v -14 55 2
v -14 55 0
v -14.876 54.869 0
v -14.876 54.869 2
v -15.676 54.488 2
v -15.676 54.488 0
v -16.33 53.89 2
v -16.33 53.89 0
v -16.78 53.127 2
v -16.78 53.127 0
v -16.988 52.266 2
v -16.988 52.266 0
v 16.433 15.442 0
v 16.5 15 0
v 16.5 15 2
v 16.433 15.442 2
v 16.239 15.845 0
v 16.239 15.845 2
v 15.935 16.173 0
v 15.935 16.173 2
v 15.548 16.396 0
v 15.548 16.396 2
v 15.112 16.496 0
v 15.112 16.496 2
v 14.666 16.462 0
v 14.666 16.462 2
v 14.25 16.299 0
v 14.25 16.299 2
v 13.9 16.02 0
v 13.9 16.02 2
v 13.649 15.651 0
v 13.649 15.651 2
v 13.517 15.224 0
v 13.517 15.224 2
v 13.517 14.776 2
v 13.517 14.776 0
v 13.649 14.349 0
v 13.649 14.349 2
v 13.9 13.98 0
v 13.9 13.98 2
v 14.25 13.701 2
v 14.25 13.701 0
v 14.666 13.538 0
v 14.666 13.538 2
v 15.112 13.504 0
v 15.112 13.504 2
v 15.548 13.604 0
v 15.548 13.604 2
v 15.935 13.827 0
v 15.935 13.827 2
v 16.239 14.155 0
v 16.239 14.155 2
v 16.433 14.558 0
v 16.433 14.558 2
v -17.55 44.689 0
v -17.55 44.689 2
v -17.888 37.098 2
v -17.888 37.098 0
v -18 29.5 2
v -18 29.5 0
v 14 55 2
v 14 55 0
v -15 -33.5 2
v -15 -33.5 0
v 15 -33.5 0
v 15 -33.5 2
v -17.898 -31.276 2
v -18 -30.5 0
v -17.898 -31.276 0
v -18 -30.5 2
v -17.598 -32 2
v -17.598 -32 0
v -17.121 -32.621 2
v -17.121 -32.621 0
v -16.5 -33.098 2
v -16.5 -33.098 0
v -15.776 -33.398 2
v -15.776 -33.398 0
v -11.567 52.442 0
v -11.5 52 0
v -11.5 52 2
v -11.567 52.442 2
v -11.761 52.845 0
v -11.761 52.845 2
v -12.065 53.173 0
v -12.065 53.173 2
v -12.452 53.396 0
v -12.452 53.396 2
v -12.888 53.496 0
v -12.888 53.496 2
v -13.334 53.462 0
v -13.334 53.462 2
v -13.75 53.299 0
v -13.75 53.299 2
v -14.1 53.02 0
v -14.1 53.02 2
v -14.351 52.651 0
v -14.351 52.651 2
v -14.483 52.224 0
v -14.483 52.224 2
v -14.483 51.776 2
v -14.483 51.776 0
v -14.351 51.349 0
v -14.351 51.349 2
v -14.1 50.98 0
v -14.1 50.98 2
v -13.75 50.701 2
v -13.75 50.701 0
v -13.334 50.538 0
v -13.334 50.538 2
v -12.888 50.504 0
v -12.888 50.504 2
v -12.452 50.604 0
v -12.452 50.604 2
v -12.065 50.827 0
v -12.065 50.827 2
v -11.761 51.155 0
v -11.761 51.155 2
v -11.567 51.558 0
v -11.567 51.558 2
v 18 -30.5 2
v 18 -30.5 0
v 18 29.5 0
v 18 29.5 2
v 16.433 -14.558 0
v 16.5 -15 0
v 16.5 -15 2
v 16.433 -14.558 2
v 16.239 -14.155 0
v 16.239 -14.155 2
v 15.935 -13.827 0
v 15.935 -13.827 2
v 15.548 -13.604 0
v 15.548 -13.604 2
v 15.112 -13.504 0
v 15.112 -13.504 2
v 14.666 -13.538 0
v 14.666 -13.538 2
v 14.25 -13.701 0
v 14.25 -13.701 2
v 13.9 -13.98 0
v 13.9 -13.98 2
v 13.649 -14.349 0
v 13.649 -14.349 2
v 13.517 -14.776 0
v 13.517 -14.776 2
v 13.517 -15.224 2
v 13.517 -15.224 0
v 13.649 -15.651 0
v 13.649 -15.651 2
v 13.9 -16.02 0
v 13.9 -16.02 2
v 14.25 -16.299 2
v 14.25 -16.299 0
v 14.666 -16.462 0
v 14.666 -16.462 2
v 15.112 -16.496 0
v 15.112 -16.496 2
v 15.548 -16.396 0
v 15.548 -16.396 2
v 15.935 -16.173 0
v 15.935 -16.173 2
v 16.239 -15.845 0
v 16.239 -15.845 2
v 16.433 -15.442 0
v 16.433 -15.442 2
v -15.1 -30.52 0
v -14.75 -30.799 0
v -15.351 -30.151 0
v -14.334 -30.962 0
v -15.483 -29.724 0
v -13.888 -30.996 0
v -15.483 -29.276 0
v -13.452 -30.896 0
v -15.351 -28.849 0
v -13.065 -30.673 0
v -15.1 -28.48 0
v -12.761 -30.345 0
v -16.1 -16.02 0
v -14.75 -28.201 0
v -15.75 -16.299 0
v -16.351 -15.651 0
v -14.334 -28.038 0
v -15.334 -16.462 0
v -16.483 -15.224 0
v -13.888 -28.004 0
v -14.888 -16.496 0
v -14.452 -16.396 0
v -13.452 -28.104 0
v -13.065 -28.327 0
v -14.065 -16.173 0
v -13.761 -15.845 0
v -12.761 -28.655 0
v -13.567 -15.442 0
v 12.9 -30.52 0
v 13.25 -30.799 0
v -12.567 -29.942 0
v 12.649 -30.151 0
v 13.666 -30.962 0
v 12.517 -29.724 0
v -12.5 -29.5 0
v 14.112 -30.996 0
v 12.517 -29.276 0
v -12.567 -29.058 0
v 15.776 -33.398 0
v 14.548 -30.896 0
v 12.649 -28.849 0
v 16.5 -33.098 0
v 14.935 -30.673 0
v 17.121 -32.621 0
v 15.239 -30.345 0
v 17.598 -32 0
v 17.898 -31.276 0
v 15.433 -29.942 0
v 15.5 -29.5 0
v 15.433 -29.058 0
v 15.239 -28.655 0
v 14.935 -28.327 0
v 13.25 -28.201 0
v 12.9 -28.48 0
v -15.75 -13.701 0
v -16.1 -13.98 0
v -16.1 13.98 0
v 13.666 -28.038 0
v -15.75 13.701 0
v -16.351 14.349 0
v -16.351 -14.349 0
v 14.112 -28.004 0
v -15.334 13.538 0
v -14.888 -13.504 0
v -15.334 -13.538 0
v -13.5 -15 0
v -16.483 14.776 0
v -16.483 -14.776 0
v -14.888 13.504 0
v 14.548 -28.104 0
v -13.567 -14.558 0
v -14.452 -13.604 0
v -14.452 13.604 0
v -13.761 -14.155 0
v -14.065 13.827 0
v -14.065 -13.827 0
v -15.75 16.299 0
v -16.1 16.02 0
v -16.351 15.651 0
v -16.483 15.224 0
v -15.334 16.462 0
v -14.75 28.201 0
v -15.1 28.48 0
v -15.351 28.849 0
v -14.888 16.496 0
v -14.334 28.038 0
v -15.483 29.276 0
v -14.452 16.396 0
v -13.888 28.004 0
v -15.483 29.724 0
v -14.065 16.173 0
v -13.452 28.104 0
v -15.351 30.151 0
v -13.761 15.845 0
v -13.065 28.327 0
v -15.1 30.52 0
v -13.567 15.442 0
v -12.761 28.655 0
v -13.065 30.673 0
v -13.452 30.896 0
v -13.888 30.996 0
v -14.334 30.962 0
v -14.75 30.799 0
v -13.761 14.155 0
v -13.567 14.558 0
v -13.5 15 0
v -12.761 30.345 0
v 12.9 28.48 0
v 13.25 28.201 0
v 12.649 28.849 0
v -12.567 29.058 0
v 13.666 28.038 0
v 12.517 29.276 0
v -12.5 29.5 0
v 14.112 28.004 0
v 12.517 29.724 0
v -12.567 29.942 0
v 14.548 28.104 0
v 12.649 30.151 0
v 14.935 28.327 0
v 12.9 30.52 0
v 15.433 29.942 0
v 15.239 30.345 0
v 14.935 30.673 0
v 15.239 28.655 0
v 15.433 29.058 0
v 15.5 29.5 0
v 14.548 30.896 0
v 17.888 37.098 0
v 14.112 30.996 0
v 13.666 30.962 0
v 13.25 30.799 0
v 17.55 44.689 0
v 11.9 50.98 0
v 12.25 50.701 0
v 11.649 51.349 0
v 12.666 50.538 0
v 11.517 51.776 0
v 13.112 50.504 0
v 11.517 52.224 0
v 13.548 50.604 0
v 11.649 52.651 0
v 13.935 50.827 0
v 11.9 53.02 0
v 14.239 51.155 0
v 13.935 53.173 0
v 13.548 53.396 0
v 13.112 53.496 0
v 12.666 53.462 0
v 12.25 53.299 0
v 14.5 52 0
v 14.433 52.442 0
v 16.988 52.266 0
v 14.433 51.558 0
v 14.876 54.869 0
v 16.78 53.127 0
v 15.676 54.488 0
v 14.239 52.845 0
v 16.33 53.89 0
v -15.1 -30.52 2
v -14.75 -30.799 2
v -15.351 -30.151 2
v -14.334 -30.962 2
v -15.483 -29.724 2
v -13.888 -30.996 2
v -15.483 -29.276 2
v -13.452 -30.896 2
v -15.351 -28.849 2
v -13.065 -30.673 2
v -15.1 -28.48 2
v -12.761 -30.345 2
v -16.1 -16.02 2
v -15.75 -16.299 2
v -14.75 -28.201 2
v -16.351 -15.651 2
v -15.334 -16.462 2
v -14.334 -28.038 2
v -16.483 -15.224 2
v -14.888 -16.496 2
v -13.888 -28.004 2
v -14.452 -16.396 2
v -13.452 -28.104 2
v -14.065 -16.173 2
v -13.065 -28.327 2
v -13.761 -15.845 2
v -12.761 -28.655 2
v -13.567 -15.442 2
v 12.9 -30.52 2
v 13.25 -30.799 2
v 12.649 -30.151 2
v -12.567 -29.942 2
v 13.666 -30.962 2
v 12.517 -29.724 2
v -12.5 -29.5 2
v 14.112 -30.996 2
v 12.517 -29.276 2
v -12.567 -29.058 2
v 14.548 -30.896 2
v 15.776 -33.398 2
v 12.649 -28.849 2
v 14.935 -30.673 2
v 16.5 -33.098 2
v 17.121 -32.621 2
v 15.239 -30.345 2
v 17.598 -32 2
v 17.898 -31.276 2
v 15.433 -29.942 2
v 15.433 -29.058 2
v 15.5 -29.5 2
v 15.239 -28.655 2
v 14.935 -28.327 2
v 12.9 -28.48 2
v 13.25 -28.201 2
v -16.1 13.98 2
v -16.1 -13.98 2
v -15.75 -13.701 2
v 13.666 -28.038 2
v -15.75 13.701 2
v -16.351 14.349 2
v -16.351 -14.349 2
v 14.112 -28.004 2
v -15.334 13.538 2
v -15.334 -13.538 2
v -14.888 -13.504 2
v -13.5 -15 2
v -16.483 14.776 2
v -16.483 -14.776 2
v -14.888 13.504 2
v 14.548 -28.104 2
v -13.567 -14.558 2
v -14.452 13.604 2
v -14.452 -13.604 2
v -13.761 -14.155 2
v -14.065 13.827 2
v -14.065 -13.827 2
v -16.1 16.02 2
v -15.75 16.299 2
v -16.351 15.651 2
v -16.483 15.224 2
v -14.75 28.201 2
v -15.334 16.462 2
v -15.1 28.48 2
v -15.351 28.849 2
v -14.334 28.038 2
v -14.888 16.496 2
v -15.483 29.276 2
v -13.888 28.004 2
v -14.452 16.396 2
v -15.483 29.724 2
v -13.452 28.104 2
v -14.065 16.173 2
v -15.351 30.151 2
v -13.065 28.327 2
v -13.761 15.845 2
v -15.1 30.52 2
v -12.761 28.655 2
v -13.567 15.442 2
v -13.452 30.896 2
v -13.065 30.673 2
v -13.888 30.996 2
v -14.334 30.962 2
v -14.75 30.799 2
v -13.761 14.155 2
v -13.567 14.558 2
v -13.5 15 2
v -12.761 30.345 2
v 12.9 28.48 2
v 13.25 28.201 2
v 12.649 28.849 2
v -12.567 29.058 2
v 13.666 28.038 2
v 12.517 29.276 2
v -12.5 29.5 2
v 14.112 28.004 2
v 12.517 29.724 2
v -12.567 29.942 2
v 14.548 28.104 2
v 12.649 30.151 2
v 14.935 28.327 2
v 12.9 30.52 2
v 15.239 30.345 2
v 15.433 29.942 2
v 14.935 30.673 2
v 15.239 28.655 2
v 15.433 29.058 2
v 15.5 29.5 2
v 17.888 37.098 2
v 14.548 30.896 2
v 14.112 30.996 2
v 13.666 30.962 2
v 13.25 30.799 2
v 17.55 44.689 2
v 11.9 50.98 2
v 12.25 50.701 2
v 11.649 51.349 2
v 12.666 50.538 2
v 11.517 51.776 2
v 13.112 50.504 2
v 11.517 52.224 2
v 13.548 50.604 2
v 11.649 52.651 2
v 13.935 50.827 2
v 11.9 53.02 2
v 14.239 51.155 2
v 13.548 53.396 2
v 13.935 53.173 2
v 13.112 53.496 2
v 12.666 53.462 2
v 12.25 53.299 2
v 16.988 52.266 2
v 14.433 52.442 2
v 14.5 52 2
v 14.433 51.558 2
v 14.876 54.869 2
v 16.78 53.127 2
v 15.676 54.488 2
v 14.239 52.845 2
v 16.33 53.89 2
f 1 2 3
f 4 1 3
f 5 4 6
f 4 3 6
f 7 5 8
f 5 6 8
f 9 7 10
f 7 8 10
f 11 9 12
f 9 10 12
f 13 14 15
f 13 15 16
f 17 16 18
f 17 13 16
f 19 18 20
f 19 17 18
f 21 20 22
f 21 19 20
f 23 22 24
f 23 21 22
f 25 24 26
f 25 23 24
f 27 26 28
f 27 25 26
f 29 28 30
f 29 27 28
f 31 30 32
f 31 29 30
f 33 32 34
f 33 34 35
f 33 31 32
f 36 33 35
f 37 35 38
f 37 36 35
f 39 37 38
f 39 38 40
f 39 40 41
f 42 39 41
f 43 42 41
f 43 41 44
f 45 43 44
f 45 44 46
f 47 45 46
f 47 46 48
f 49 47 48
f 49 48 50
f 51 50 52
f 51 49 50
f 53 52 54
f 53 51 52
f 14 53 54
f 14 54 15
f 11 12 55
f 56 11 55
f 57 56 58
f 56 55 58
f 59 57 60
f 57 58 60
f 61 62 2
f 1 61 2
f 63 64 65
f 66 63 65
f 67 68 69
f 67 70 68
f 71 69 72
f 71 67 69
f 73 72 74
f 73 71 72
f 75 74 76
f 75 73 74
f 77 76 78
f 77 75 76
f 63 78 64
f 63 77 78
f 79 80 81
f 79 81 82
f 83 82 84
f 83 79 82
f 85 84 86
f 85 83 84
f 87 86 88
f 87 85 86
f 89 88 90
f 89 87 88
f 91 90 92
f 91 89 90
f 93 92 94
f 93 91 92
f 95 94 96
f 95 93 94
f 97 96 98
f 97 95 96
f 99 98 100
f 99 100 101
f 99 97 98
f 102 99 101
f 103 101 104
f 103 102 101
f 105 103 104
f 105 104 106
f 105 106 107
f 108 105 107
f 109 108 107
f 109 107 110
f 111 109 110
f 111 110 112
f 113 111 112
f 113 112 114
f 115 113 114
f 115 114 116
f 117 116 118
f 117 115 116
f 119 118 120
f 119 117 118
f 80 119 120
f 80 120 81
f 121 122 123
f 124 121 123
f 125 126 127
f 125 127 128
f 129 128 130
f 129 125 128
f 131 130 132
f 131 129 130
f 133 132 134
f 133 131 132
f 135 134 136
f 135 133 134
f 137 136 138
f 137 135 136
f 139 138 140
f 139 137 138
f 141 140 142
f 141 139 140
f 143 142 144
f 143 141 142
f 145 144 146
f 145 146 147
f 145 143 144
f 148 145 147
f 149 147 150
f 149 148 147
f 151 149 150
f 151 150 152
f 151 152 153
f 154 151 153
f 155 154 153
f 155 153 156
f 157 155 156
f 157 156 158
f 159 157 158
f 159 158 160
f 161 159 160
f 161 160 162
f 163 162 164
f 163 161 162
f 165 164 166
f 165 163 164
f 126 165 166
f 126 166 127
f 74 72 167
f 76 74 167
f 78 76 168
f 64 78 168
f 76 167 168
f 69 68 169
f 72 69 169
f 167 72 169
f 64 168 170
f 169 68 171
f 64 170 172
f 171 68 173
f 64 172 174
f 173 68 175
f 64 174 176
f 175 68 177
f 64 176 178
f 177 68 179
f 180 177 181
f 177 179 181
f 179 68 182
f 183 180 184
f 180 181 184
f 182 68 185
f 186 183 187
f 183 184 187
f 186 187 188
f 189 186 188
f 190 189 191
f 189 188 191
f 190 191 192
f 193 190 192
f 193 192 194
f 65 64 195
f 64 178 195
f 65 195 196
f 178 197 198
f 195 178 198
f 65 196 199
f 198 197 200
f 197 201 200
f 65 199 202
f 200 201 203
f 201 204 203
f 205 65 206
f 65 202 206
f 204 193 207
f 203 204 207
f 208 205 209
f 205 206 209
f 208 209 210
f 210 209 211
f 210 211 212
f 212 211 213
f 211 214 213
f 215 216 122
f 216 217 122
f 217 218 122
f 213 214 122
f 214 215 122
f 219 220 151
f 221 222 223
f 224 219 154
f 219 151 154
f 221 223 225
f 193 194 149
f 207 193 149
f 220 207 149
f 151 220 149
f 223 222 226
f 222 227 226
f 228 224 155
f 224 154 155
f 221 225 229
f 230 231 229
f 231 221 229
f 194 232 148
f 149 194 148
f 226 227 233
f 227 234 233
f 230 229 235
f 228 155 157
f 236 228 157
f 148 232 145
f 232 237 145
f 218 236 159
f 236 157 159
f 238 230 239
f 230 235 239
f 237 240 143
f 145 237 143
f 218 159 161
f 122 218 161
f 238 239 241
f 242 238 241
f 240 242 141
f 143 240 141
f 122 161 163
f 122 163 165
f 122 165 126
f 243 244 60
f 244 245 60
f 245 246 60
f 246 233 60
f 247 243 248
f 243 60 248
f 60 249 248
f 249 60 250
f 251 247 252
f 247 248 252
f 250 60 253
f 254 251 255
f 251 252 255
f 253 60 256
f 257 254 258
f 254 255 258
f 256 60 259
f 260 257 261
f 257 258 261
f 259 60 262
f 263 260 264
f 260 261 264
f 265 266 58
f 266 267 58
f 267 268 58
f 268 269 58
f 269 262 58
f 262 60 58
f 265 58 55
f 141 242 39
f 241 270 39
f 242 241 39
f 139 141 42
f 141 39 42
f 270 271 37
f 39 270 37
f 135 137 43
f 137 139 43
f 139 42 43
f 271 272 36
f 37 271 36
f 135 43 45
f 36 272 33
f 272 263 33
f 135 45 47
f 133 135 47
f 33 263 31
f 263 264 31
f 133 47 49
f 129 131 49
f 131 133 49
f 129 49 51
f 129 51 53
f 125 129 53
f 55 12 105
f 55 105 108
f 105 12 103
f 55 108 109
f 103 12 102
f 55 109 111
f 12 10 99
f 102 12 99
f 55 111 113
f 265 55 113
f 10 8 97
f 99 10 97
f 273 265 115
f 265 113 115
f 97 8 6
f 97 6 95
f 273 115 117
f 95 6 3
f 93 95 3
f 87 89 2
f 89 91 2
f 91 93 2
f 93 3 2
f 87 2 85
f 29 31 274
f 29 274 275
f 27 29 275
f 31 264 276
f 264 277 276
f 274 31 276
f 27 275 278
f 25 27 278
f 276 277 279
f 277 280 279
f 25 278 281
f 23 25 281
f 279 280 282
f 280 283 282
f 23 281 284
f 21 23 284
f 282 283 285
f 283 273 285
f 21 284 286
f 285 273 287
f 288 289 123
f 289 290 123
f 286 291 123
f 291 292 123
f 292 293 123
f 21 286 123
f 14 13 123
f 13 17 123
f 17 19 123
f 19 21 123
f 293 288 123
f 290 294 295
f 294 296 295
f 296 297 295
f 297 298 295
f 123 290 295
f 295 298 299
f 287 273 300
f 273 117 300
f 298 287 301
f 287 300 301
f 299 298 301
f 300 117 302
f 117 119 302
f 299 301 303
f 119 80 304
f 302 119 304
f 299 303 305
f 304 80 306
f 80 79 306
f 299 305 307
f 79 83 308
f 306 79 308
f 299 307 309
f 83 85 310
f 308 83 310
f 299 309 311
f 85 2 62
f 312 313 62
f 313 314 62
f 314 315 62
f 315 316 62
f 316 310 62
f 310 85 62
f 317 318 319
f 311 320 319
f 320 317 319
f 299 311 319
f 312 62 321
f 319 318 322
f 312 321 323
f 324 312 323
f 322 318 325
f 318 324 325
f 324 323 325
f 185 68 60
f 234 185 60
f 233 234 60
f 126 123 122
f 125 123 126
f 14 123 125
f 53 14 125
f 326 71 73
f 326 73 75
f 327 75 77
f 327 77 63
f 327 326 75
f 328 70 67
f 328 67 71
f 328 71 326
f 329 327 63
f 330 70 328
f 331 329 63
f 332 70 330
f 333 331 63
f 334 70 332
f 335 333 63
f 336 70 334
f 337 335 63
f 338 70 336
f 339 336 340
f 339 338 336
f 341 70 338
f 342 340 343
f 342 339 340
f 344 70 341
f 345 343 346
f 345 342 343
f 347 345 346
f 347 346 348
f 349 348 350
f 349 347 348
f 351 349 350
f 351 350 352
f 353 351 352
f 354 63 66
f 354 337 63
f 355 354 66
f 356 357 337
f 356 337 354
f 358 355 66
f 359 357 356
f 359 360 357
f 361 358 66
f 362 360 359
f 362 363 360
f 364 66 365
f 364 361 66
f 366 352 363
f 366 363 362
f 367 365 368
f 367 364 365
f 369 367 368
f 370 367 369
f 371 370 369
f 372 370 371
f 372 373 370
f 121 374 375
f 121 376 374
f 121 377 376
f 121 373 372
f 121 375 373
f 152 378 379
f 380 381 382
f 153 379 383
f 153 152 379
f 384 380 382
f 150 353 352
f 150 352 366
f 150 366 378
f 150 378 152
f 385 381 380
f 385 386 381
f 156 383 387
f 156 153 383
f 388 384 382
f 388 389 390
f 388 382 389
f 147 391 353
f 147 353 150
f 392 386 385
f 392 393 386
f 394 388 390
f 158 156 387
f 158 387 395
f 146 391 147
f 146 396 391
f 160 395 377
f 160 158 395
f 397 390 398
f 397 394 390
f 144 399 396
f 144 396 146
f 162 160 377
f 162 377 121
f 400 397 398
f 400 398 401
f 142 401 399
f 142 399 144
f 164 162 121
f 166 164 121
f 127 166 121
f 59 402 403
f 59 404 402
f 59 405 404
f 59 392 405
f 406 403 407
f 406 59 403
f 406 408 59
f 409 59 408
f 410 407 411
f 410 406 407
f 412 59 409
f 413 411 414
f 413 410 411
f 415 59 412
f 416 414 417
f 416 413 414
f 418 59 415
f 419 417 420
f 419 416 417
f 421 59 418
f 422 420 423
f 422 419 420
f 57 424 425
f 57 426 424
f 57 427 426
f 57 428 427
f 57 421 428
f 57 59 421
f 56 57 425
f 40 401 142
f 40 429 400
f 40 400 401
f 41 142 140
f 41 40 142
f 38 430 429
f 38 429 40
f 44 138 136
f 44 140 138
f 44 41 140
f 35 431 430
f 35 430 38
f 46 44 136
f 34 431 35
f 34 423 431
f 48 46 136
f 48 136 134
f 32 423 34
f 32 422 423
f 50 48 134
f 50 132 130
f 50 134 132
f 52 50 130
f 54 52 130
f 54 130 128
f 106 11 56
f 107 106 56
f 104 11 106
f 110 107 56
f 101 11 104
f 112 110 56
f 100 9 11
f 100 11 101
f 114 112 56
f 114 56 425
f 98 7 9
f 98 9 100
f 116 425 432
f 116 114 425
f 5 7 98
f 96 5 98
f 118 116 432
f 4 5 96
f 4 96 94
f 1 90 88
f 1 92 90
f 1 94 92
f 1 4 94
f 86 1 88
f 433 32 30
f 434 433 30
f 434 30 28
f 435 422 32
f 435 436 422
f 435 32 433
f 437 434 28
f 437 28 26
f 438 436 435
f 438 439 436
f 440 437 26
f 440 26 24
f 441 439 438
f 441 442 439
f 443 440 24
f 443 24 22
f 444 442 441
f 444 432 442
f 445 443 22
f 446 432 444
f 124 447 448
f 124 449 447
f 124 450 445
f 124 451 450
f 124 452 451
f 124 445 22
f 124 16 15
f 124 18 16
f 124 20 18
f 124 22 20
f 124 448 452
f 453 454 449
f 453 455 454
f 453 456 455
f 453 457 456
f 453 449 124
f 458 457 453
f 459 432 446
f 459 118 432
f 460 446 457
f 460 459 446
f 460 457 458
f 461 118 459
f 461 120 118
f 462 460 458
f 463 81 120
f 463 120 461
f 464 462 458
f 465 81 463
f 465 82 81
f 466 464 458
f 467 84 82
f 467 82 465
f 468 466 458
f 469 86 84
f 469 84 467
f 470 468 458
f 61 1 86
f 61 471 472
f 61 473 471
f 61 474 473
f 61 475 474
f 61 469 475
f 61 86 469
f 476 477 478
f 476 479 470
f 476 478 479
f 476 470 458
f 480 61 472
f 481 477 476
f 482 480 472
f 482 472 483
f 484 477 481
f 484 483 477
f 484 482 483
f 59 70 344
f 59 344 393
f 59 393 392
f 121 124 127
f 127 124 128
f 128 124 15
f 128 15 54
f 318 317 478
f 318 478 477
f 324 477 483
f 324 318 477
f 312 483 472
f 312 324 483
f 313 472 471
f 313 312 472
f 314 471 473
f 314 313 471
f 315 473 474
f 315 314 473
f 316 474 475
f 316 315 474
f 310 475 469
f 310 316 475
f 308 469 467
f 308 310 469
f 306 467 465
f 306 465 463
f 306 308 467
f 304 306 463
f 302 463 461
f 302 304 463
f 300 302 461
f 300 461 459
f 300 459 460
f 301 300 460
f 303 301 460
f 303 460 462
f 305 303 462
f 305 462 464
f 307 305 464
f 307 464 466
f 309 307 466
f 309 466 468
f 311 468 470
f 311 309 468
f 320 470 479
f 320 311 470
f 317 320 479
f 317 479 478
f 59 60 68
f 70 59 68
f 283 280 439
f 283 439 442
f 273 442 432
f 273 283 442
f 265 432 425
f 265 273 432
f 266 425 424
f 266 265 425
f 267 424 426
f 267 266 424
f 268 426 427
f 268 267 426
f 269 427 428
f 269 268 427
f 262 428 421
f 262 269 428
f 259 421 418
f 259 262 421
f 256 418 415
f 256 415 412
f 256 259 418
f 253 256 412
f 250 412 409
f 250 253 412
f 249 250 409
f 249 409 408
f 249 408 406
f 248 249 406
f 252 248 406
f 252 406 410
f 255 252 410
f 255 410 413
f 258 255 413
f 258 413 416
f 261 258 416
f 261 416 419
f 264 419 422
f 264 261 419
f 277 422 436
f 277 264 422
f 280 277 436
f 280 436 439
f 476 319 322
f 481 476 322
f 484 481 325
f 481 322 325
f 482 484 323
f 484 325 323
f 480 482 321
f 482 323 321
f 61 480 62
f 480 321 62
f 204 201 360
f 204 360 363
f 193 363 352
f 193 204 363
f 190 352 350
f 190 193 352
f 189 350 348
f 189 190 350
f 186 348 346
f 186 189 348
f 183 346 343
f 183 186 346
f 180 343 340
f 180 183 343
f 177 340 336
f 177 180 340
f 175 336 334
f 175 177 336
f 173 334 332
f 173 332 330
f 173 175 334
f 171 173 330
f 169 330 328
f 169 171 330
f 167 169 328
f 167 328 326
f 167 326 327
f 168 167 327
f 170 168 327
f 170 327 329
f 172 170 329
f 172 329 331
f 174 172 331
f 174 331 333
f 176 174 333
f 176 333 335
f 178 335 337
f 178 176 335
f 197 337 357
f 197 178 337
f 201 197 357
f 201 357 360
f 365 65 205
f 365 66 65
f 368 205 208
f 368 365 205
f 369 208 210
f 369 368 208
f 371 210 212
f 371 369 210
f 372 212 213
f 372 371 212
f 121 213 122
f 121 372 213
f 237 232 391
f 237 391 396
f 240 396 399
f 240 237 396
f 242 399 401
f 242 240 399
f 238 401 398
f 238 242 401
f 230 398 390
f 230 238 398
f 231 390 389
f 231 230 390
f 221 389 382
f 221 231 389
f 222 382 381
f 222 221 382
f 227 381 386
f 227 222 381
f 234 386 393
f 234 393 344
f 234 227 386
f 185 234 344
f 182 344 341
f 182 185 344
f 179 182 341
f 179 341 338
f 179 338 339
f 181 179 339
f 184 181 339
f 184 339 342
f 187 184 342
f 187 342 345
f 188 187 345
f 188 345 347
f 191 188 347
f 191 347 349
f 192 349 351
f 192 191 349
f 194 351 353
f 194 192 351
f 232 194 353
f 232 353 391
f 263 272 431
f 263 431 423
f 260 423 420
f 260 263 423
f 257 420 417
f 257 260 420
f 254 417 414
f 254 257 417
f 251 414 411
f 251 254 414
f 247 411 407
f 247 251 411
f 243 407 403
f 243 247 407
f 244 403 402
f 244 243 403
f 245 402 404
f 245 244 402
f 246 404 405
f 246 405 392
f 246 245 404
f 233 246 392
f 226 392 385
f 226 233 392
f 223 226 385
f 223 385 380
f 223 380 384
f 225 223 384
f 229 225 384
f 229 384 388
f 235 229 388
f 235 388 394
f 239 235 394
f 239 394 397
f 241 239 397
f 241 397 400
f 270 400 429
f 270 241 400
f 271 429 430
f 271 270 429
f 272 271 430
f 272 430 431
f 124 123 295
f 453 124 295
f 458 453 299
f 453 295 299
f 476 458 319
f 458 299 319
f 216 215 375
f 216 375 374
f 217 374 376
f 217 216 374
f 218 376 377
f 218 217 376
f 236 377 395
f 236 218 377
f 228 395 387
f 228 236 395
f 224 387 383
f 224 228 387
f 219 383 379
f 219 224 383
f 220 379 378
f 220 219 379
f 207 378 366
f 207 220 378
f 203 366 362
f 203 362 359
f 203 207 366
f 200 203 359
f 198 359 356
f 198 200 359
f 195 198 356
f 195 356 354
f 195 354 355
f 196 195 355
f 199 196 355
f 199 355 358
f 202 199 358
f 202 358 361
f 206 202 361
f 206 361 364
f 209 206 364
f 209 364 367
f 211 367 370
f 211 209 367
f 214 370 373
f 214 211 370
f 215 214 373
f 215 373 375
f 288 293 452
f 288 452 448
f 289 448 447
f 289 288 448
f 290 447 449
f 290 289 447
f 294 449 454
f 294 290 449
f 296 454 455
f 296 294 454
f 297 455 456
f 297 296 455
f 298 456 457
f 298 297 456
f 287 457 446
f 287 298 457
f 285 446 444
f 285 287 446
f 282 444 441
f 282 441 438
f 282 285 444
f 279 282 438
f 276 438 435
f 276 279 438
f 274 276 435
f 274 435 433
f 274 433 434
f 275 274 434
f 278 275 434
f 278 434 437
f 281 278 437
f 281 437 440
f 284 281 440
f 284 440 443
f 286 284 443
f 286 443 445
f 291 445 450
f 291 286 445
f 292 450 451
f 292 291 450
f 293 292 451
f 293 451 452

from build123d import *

# Parameters (mm, degrees)
SKETCH1_R           = 1.5
BOSS_EXTRUDE1_DEPTH = 2
FILLET1_R           = 3


with BuildPart() as part:
    # Sketch1 → Boss-Extrude1 (new body)
    with BuildSketch(Plane.XY):
        with BuildLine():
            Line((-18, 29.5), (-18, -33.5))
            Line((-18, -33.5), (18, -33.5))
            Line((18, -33.5), (18, 29.5))
            ThreePointArc((18, 29.5), (17.746918084, 40.89430747), (16.988171513, 52.266140956))
            ThreePointArc((16.988171513, 52.266140956), (16.025040386, 54.213416236), (14, 55))
            Line((14, 55), (-14, 55))
            ThreePointArc((-14, 55), (-16.025040386, 54.213416236), (-16.988171513, 52.266140956))
            ThreePointArc((-16.988171513, 52.266140956), (-17.746918084, 40.89430747), (-18, 29.5))
        make_face()
        with Locations((-14, 29.5)):
            Circle(SKETCH1_R, mode=Mode.SUBTRACT)
        with Locations((14, 29.5)):
            Circle(SKETCH1_R, mode=Mode.SUBTRACT)
        with Locations((-14, -29.5)):
            Circle(SKETCH1_R, mode=Mode.SUBTRACT)
        with Locations((14, -29.5)):
            Circle(SKETCH1_R, mode=Mode.SUBTRACT)
        with Locations((15, 15)):
            Circle(SKETCH1_R, mode=Mode.SUBTRACT)
        with Locations((15, -15)):
            Circle(SKETCH1_R, mode=Mode.SUBTRACT)
        with Locations((-15, -15)):
            Circle(SKETCH1_R, mode=Mode.SUBTRACT)
        with Locations((-15, 15)):
            Circle(SKETCH1_R, mode=Mode.SUBTRACT)
        with Locations((-13, 52)):
            Circle(SKETCH1_R, mode=Mode.SUBTRACT)
        with Locations((13, 52)):
            Circle(SKETCH1_R, mode=Mode.SUBTRACT)
    extrude(amount=BOSS_EXTRUDE1_DEPTH)

    # Fillet1
    fillet1_edges = [part.edges().sort_by_distance(p)[0] for p in [
        (18, -33.5, 1),
        (-18, -33.5, 1),
    ]]
    fillet(fillet1_edges, radius=FILLET1_R)


solid = part.part
